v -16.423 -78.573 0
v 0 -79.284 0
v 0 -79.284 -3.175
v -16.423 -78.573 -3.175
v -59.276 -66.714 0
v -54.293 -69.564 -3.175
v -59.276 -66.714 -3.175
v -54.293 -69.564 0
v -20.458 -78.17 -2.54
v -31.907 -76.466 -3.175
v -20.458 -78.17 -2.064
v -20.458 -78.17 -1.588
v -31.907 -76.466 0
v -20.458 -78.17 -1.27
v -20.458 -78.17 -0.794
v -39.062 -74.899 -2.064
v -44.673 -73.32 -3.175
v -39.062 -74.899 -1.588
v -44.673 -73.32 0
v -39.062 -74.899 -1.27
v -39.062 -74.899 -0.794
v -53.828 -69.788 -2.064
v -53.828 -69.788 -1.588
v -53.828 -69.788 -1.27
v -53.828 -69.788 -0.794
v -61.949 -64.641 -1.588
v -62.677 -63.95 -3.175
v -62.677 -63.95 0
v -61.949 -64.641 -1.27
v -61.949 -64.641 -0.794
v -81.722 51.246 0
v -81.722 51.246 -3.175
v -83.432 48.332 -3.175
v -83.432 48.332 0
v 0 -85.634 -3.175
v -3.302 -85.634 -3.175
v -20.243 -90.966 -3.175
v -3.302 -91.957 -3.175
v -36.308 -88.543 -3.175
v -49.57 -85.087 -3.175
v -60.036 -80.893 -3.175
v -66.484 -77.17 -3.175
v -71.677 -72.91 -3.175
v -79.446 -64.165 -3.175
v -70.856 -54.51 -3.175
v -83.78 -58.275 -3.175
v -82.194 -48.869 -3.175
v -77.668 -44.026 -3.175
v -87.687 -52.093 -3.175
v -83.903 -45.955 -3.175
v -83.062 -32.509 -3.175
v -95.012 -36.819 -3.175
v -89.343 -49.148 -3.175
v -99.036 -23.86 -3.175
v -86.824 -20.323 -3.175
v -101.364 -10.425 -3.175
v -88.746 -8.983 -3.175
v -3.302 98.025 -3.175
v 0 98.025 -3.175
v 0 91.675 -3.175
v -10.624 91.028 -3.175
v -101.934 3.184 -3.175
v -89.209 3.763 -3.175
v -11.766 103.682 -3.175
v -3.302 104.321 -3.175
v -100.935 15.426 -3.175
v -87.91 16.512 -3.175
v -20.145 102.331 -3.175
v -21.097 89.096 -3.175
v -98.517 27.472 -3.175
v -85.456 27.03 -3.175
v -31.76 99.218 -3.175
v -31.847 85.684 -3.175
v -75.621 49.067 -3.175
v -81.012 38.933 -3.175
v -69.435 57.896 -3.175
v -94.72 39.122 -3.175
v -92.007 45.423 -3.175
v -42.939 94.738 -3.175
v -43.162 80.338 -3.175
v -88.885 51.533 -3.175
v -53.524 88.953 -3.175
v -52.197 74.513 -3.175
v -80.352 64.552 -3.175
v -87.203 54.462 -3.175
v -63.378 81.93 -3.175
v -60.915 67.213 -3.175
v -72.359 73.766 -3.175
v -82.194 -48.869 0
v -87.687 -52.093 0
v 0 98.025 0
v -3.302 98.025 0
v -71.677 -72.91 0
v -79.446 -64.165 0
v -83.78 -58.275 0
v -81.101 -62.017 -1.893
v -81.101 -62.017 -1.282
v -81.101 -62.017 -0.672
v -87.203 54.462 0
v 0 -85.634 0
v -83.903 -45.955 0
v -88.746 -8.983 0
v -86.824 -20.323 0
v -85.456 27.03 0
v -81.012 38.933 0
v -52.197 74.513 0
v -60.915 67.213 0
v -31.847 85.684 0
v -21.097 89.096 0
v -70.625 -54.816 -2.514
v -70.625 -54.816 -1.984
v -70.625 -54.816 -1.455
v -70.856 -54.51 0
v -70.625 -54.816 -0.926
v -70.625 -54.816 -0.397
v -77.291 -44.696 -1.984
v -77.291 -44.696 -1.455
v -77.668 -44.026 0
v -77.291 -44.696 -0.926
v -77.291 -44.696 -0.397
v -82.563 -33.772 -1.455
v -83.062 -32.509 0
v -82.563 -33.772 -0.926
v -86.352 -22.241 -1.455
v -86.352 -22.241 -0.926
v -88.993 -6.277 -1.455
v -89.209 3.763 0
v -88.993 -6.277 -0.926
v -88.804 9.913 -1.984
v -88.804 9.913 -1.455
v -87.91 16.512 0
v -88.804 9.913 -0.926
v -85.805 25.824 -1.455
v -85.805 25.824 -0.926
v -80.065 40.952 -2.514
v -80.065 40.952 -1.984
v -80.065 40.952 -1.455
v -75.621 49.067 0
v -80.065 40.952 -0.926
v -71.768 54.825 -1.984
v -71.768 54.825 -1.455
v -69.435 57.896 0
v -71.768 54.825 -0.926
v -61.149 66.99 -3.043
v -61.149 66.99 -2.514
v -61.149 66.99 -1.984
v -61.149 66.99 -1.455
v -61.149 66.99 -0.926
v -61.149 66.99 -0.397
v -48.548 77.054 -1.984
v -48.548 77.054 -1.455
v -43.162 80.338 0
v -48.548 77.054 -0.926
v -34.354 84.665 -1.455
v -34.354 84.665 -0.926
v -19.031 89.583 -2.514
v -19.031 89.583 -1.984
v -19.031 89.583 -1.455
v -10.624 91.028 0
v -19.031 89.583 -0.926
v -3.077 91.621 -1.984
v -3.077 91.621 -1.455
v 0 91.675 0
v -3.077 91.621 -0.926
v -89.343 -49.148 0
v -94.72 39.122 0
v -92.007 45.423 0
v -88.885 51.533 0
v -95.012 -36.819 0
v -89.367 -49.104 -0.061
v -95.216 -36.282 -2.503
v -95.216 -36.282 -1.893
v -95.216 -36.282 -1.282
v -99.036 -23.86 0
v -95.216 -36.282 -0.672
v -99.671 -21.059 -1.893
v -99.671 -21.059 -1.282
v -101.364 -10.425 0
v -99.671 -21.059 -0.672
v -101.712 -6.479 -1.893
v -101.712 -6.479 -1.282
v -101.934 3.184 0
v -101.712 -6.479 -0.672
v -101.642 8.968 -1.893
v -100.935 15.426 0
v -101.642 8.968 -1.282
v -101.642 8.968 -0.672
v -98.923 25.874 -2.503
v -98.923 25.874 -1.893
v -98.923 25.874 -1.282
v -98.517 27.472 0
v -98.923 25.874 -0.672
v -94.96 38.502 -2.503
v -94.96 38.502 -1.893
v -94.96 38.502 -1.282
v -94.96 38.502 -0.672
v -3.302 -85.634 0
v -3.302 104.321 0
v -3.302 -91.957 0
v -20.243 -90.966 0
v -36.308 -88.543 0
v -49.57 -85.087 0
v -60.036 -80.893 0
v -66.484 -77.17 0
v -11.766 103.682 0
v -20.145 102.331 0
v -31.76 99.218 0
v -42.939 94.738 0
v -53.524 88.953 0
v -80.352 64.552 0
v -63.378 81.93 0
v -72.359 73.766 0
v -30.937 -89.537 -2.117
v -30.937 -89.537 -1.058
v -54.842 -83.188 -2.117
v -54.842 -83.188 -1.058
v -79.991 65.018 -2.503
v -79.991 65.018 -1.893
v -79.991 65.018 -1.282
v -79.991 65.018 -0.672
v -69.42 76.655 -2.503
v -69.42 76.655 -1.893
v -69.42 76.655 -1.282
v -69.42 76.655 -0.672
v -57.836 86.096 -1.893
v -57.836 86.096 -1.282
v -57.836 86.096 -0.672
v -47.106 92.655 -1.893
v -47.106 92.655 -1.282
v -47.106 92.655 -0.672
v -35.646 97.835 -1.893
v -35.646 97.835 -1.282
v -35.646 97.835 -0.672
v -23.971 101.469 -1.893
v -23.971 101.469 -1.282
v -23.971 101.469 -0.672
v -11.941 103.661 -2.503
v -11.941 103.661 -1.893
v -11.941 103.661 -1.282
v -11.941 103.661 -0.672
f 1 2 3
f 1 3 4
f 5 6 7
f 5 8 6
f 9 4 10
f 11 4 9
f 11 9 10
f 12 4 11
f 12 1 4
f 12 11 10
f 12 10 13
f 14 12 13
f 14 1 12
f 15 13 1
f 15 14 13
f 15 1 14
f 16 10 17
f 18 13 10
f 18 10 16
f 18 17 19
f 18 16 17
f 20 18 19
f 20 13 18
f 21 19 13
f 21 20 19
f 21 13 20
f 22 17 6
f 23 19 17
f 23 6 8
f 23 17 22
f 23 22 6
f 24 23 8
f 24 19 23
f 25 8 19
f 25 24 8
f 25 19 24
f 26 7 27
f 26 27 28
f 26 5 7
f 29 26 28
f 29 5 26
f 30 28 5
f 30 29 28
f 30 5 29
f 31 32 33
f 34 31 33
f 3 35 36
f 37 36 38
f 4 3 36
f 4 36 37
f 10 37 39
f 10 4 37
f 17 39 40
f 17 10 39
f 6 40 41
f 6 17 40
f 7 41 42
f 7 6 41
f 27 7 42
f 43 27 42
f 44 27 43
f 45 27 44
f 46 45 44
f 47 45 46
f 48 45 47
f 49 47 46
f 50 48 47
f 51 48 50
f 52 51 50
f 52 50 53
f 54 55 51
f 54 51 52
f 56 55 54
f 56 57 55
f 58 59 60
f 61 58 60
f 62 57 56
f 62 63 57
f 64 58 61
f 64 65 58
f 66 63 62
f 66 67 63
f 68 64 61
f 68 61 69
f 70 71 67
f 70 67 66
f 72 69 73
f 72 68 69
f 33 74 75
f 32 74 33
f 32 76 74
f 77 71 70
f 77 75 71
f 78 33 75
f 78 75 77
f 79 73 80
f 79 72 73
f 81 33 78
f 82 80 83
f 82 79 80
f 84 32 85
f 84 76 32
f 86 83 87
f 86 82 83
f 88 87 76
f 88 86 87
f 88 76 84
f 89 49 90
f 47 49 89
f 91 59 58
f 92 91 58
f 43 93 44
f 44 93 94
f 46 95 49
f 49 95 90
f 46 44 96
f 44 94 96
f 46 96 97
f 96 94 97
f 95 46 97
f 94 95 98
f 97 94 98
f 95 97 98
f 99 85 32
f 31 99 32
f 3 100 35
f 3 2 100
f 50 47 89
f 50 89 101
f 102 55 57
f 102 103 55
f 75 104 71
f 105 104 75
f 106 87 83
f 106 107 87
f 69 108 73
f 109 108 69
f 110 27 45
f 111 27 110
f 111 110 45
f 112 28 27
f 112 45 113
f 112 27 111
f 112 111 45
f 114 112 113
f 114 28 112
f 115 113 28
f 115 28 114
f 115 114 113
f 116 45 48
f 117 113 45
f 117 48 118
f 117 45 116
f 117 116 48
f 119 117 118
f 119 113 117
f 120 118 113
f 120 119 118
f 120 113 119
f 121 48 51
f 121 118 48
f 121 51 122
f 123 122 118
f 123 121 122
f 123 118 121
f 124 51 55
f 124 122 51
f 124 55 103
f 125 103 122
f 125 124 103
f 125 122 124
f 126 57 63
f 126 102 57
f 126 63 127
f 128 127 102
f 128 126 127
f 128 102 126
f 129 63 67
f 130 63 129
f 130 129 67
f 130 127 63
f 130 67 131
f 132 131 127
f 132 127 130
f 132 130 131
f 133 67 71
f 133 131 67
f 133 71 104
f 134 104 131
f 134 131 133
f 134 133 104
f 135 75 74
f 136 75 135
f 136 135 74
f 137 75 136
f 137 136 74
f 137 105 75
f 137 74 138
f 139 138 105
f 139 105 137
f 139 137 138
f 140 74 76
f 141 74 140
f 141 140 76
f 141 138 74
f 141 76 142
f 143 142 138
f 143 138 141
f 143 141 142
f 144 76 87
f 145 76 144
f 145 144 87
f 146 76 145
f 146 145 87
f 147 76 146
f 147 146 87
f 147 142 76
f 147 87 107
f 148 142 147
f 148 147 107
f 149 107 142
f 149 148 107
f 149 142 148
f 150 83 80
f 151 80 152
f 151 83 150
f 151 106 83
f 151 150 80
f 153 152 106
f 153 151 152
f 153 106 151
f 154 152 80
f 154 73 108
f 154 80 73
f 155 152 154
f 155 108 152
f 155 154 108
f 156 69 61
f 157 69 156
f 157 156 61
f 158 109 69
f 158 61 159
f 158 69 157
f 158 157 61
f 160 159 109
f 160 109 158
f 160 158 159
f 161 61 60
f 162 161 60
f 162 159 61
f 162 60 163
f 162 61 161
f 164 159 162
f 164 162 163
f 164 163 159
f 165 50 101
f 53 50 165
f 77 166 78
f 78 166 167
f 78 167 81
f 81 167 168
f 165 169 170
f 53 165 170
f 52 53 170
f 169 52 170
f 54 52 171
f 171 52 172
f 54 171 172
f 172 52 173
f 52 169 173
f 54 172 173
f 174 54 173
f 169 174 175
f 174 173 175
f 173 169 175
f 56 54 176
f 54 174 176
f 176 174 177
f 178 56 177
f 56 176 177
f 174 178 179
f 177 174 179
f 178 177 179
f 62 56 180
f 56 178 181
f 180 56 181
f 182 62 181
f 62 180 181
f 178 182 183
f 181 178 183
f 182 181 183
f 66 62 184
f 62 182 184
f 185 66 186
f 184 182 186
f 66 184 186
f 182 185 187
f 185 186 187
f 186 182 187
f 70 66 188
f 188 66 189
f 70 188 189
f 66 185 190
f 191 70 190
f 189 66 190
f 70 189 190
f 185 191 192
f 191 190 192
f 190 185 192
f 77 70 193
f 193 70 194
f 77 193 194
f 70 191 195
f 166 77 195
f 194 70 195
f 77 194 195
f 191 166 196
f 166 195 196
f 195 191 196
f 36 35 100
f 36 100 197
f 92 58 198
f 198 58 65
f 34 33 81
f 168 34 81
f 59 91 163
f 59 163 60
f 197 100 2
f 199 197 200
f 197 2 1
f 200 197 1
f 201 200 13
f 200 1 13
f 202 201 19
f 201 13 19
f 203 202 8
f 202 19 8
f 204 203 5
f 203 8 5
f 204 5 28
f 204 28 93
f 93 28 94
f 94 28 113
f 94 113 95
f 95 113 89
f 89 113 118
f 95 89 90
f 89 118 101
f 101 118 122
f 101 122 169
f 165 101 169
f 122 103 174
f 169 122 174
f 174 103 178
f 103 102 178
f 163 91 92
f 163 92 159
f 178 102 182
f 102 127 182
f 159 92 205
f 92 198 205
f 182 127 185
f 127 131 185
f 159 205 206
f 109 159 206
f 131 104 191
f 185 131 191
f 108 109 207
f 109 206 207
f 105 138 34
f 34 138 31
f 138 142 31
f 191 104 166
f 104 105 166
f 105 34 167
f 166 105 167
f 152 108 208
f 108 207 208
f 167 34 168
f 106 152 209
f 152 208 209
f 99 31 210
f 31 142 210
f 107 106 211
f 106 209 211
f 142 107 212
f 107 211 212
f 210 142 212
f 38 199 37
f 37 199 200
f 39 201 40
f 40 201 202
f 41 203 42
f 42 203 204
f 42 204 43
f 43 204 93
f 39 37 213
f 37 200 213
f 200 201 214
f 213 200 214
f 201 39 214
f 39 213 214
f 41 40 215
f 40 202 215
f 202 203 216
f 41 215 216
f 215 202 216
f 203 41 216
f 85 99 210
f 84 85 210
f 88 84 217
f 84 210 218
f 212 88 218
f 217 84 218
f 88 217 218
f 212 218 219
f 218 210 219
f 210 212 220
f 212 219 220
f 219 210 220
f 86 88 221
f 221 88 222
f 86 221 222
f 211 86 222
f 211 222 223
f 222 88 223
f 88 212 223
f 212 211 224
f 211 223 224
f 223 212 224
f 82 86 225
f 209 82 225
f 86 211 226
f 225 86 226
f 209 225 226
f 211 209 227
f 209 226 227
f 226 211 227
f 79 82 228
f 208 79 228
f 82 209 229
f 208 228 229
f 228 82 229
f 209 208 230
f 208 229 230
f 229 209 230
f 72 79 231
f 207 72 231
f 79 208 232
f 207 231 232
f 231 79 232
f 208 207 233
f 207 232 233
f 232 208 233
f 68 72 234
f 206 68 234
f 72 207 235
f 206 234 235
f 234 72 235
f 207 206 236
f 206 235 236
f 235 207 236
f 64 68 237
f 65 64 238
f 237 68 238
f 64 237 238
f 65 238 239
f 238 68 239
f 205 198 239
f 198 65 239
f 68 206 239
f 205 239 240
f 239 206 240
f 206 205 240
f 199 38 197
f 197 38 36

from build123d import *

# Parameters (mm, degrees)
BOSS_EXTRUDE1_DEPTH = 3.175
SKETCH3_W           = 129.389558459
SKETCH3_H           = 294.720660933
CUT_EXTRUDE1_DEPTH  = 102.960845412
SKETCH4_W           = 3.302
SKETCH4_H           = 12.7
CUT_EXTRUDE2_DEPTH  = 4.1750001


with BuildPart() as part:
    # Sketch2 → Boss-Extrude1 (new body)
    with BuildSketch(Plane.XY):
        with BuildLine():
            add(Edge.make_bspline(
                [(-71.677392112, -72.91043434), (-72.109242456, -72.4766599), (-72.972872043, -71.593614958), (-74.469591152, -70.002616718), (-75.837182996, -68.488043391), (-77.186084408, -66.931897067), (-78.515677479, -65.334729876), (-79.824432739, -63.69624614), (-81.54760822, -61.446428575), (-83.64161213, -58.529673548), (-85.629566809, -55.501403393), (-87.162218254, -52.997335562), (-88.285911427, -51.070131488), (-90.114728738, -47.772436811), (-92.549922179, -42.891387424), (-95.3516338, -36.175158441), (-97.806777615, -28.854790192), (-99.416568113, -22.492651102), (-100.484378106, -16.973479224), (-101.217383692, -12.115821661), (-101.805900705, -6.108471449), (-102.055561509, 1.055644647), (-101.63758347, 11.916616183), (-99.581715265, 24.703392789), (-94.947787628, 39.477591596), (-88.656512854, 52.708120751), (-80.043367163, 65.554146484), (-69.871244821, 76.755385293), (-58.636991603, 85.914826096), (-47.202028885, 92.898966836), (-35.790499648, 98.052224226), (-24.000842482, 101.716725174), (-12.029496563, 103.894248368), (-3.656941748, 104.395312689), (0.99110515, 104.372307848), (2.644688984, 104.347784008), (5.295920706, 104.255895368), (8.944129249, 104.002381094), (12.923536456, 103.566176285), (16.897932891, 102.969160213), (20.860675893, 102.210568115), (24.80503533, 101.28991654), (28.724197829, 100.207008268), (32.611281662, 98.961940132), (36.459348765, 97.555109249), (39.942943882, 96.118550993), (42.44327487, 94.981609399), (43.99462248, 94.237634049), (44.922549304, 93.78091779), (45.846607961, 93.314294304), (46.766722746, 92.837849145), (47.682656642, 92.351383169), (48.561810847, 91.873519084), (49.188310006, 91.524412896), (49.500915025, 91.348034768)],
                knots=[0, 0, 0, 0, 0.006795371, 0.013653749, 0.020575359, 0.027560428, 0.034609183, 0.041721853, 0.048898669, 0.063445664, 0.078252032, 0.085753069, 0.093319659, 0.100952039, 0.124124286, 0.148784986, 0.174947707, 0.20262677, 0.215493637, 0.232144402, 0.252599943, 0.276885796, 0.305032091, 0.363115877, 0.408011314, 0.462235121, 0.511576331, 0.564908162, 0.615597651, 0.658548959, 0.700915758, 0.742691235, 0.783870362, 0.824449909, 0.827808956, 0.831171349, 0.841278604, 0.854801757, 0.868378359, 0.882008332, 0.895691582, 0.909427999, 0.923217451, 0.937059793, 0.95095486, 0.964902468, 0.975397534, 0.978902417, 0.982410558, 0.985921952, 0.989436598, 0.99295449, 0.996475625, 1, 1, 1, 1], degree=3))
            add(Edge.make_bspline(
                [(49.500915025, 91.348034768), (49.872005924, 91.138482333), (50.241810712, 90.926750039), (50.610303013, 90.712853821)],
                knots=[0, 0, 0, 0, 1, 1, 1, 1], degree=3))
            add(Edge.make_bspline(
                [(50.610303013, 90.712853821), (51.128442093, 90.411846037), (52.167202685, 89.796039228), (53.932536969, 88.703576387), (55.579762788, 87.638711627), (57.218137155, 86.533145805), (58.847026669, 85.387425363), (60.465187486, 84.201108463), (62.61485058, 82.559008476), (65.268683437, 80.403244909), (68.38020159, 77.661045558), (71.420405526, 74.753669295), (74.379227375, 71.68115848), (77.246352549, 68.444125522), (79.542797672, 65.619898893), (81.324264236, 63.280297585), (82.635173495, 61.479754257), (83.915139631, 59.639466174), (85.682600666, 56.976700672), (87.896856718, 53.369477174), (90.462597049, 48.676901727), (92.889220315, 43.626105667), (95.132677705, 38.215723181), (97.146538959, 32.44823322), (98.88212407, 26.330630408), (100.289240179, 19.875099059), (101.25863273, 13.473856941), (101.817336128, 7.24671143), (102.015185645, 1.305015561), (101.87858065, -4.624237286), (101.39263307, -10.734726225), (100.537146292, -16.867570025), (99.329398352, -22.86381348), (97.893600846, -28.372193875), (96.656960211, -32.269847721), (95.785564151, -34.744415114), (95.0459628, -36.764317914), (93.953188789, -39.535816997), (92.43580554, -43.007047711), (90.821696456, -46.36490671), (89.118620831, -49.608230444), (87.334164726, -52.736260206), (85.475724639, -55.748623833), (83.55049497, -58.64531039), (81.56545684, -61.42664709), (79.307705413, -64.380683017), (77.436977348, -66.647222523), (76.007346494, -68.288860963), (75.29509586, -69.089727056), (74.579038656, -69.87823774), (73.859443089, -70.654502436), (73.136338858, -71.418398838), (72.317504882, -72.264736672), (71.891235125, -72.69667798), (71.678426975, -72.91043429)],
                knots=[0, 0, 0, 0, 0.010157109, 0.020393378, 0.030708694, 0.04110294, 0.051575992, 0.062127721, 0.072757993, 0.094253595, 0.116061609, 0.138180754, 0.160609666, 0.183346893, 0.206390897, 0.218027437, 0.229740057, 0.241528542, 0.253392669, 0.280162256, 0.30828042, 0.337739229, 0.368530108, 0.400643849, 0.434070605, 0.468799897, 0.504820602, 0.536144777, 0.567394405, 0.598569553, 0.629670285, 0.664058743, 0.696204476, 0.726123241, 0.753829745, 0.760691378, 0.767515904, 0.787767528, 0.807687634, 0.827278023, 0.846540474, 0.865476741, 0.88408856, 0.902377642, 0.920345676, 0.937994331, 0.961031903, 0.966703489, 0.972340071, 0.97794171, 0.983508463, 0.989040391, 0.99453755, 1, 1, 1, 1], degree=3))
            add(Edge.make_bspline(
                [(71.678426975, -72.91043429), (46.359928794, -98.341734638), (-46.358893881, -98.341734638), (-71.677392112, -72.91043434)],
                knots=[0, 0, 0, 0, 1, 1, 1, 1], degree=3, weights=[1, 1, 1, 1]))
        make_face()
        with BuildLine():
            add(Edge.make_bspline(
                [(-62.677197057, -63.950161522), (-62.895509204, -63.730876692), (-63.321725733, -63.298342375), (-64.002059554, -62.592101669), (-64.753829554, -61.794622516), (-65.703931611, -60.764569773), (-66.804574903, -59.527416198), (-68.556788175, -57.468052236), (-70.648178443, -54.835505477), (-73.811350461, -50.469012961), (-77.394544541, -44.756057433), (-82.302878117, -35.13540616), (-86.810757895, -22.360038108), (-90.354277409, -0.967371821), (-87.649941962, 26.350088977), (-73.333390238, 55.972118358), (-49.623996274, 78.708841275), (-24.487235723, 89.383519301), (-3.090994932, 92.115890306), (13.038963103, 91.197514401), (26.120286031, 87.996586306), (34.879374941, 84.524845656), (39.102105625, 82.510352052), (41.214271269, 81.410816796), (42.347028641, 80.797644792), (42.959233617, 80.456937494), (43.258169219, 80.288282027)],
                knots=[0, 0, 0, 0, 0.003906217, 0.007812434, 0.01171865, 0.015624867, 0.023437301, 0.031249734, 0.046874602, 0.062499469, 0.093749203, 0.124998938, 0.187498407, 0.249997875, 0.374996813, 0.499995751, 0.624994688, 0.749993626, 0.812493095, 0.874992564, 0.937492033, 0.968741767, 0.984366634, 0.992179068, 0.996085285, 0.999991501, 0.999991501, 0.999991501, 0.999991501], degree=3))
            add(Edge.make_bspline(
                [(43.258169219, 80.288282027), (43.339663738, 80.24226006), (43.502520945, 80.149972739), (43.746371392, 80.01083423), (43.989796594, 79.870982545), (44.151786326, 79.777278604), (44.232713854, 79.73030574)],
                knots=[0.002022438, 0.002022438, 0.002022438, 0.002022438, 0.251013535, 0.500004632, 0.748995729, 0.997986827, 0.997986827, 0.997986827, 0.997986827], degree=3))
            add(Edge.make_bspline(
                [(44.232713854, 79.73030574), (44.58444416, 79.525959484), (45.259622085, 79.127643656), (46.415361761, 78.422292298), (47.573803007, 77.692810893), (49.007921659, 76.758403592), (50.804832808, 75.530634538), (53.607223777, 73.493209173), (57.003409969, 70.790302329), (64.764138566, 63.842060668), (74.853642347, 51.769295456), (84.311822541, 33.000711524), (89.302574517, 12.581832114), (89.594071681, -8.463887057), (85.167338267, -29.022546245), (78.471156755, -43.288686452), (72.737789819, -52.004533398), (70.145497848, -55.492337454), (67.954788222, -58.18874646), (66.537169113, -59.834423786), (65.376799992, -61.124092609), (64.636118066, -61.923784826), (64.04885936, -62.544039678), (63.540759488, -63.072130947), (63.065749199, -63.559376825), (62.8132246, -63.814567336), (62.678231924, -63.950161468)],
                knots=[1.4601e-05, 1.4601e-05, 1.4601e-05, 1.4601e-05, 0.007826987, 0.015639373, 0.023451759, 0.031264145, 0.046888916, 0.062513688, 0.093763232, 0.125012776, 0.250010951, 0.375009125, 0.5000073, 0.625005475, 0.75000365, 0.875001825, 0.906251369, 0.937500913, 0.953125684, 0.968750456, 0.976562842, 0.984375228, 0.988281421, 0.992187614, 0.996093807, 1, 1, 1, 1], degree=3))
            add(Edge.make_bspline(
                [(62.678231924, -63.950161468), (62.442110433, -64.187331736), (61.973465348, -64.632177633), (60.848308103, -65.594894105), (59.178943877, -66.825880953), (56.737455869, -68.325151322), (52.942333804, -70.28884928), (47.260951473, -72.599488515), (39.221466424, -74.977986937), (30.229046438, -76.880115217), (17.304785319, -78.721740765), (0.000517457, -79.658688067), (-17.303750406, -78.721740765), (-30.228011525, -76.880115217), (-39.22043151, -74.977986937), (-47.25991656, -72.599488515), (-52.941298891, -70.28884928), (-56.736420955, -68.325151322), (-59.177908963, -66.825880953), (-60.84727319, -65.594894105), (-61.972430435, -64.632177633), (-62.441075519, -64.187331736), (-62.677197057, -63.950161522)],
                knots=[0, 0, 0, 0, 0.015625, 0.03125, 0.0625, 0.09375, 0.125, 0.1875, 0.25, 0.3125, 0.375, 0.5, 0.625, 0.6875, 0.75, 0.8125, 0.875, 0.90625, 0.9375, 0.96875, 0.984375, 1, 1, 1, 1], degree=3))
        make_face(mode=Mode.SUBTRACT)
    extrude(amount=-BOSS_EXTRUDE1_DEPTH)

    # Sketch3 → Cut-Extrude1 (cut, through all)
    with BuildSketch(Plane(origin=(0, 0, 0), x_dir=(0, 0, -1), z_dir=(1, 0, 0))):
        with Locations((3.684090068, 10.698040846)):
            Rectangle(SKETCH3_W, SKETCH3_H)
    extrude(amount=CUT_EXTRUDE1_DEPTH, mode=Mode.SUBTRACT)

    # Sketch4 → Cut-Extrude2 (cut, through all)
    with BuildSketch(Plane(origin=(0, 0, -3.175), x_dir=(-1, 0, 0), z_dir=(0, 0, -1))):
        with Locations((1.651, 104.37520294)):
            Rectangle(SKETCH4_W, SKETCH4_H)
        Polygon((81.722062158, 51.245774998), (83.431923254, 48.332253027), (94.385013368, 54.760302263), (92.675152271, 57.673824233), align=None)
        Polygon((82.193637427, -48.868559709), (83.903498529, -45.955037742), (94.85658863, -52.383086998), (93.146727528, -55.296608965), align=None)
        with Locations((1.651, -91.983909146)):
            Rectangle(SKETCH4_W, SKETCH4_H)
    extrude(amount=-CUT_EXTRUDE2_DEPTH, mode=Mode.SUBTRACT)


solid = part.part
